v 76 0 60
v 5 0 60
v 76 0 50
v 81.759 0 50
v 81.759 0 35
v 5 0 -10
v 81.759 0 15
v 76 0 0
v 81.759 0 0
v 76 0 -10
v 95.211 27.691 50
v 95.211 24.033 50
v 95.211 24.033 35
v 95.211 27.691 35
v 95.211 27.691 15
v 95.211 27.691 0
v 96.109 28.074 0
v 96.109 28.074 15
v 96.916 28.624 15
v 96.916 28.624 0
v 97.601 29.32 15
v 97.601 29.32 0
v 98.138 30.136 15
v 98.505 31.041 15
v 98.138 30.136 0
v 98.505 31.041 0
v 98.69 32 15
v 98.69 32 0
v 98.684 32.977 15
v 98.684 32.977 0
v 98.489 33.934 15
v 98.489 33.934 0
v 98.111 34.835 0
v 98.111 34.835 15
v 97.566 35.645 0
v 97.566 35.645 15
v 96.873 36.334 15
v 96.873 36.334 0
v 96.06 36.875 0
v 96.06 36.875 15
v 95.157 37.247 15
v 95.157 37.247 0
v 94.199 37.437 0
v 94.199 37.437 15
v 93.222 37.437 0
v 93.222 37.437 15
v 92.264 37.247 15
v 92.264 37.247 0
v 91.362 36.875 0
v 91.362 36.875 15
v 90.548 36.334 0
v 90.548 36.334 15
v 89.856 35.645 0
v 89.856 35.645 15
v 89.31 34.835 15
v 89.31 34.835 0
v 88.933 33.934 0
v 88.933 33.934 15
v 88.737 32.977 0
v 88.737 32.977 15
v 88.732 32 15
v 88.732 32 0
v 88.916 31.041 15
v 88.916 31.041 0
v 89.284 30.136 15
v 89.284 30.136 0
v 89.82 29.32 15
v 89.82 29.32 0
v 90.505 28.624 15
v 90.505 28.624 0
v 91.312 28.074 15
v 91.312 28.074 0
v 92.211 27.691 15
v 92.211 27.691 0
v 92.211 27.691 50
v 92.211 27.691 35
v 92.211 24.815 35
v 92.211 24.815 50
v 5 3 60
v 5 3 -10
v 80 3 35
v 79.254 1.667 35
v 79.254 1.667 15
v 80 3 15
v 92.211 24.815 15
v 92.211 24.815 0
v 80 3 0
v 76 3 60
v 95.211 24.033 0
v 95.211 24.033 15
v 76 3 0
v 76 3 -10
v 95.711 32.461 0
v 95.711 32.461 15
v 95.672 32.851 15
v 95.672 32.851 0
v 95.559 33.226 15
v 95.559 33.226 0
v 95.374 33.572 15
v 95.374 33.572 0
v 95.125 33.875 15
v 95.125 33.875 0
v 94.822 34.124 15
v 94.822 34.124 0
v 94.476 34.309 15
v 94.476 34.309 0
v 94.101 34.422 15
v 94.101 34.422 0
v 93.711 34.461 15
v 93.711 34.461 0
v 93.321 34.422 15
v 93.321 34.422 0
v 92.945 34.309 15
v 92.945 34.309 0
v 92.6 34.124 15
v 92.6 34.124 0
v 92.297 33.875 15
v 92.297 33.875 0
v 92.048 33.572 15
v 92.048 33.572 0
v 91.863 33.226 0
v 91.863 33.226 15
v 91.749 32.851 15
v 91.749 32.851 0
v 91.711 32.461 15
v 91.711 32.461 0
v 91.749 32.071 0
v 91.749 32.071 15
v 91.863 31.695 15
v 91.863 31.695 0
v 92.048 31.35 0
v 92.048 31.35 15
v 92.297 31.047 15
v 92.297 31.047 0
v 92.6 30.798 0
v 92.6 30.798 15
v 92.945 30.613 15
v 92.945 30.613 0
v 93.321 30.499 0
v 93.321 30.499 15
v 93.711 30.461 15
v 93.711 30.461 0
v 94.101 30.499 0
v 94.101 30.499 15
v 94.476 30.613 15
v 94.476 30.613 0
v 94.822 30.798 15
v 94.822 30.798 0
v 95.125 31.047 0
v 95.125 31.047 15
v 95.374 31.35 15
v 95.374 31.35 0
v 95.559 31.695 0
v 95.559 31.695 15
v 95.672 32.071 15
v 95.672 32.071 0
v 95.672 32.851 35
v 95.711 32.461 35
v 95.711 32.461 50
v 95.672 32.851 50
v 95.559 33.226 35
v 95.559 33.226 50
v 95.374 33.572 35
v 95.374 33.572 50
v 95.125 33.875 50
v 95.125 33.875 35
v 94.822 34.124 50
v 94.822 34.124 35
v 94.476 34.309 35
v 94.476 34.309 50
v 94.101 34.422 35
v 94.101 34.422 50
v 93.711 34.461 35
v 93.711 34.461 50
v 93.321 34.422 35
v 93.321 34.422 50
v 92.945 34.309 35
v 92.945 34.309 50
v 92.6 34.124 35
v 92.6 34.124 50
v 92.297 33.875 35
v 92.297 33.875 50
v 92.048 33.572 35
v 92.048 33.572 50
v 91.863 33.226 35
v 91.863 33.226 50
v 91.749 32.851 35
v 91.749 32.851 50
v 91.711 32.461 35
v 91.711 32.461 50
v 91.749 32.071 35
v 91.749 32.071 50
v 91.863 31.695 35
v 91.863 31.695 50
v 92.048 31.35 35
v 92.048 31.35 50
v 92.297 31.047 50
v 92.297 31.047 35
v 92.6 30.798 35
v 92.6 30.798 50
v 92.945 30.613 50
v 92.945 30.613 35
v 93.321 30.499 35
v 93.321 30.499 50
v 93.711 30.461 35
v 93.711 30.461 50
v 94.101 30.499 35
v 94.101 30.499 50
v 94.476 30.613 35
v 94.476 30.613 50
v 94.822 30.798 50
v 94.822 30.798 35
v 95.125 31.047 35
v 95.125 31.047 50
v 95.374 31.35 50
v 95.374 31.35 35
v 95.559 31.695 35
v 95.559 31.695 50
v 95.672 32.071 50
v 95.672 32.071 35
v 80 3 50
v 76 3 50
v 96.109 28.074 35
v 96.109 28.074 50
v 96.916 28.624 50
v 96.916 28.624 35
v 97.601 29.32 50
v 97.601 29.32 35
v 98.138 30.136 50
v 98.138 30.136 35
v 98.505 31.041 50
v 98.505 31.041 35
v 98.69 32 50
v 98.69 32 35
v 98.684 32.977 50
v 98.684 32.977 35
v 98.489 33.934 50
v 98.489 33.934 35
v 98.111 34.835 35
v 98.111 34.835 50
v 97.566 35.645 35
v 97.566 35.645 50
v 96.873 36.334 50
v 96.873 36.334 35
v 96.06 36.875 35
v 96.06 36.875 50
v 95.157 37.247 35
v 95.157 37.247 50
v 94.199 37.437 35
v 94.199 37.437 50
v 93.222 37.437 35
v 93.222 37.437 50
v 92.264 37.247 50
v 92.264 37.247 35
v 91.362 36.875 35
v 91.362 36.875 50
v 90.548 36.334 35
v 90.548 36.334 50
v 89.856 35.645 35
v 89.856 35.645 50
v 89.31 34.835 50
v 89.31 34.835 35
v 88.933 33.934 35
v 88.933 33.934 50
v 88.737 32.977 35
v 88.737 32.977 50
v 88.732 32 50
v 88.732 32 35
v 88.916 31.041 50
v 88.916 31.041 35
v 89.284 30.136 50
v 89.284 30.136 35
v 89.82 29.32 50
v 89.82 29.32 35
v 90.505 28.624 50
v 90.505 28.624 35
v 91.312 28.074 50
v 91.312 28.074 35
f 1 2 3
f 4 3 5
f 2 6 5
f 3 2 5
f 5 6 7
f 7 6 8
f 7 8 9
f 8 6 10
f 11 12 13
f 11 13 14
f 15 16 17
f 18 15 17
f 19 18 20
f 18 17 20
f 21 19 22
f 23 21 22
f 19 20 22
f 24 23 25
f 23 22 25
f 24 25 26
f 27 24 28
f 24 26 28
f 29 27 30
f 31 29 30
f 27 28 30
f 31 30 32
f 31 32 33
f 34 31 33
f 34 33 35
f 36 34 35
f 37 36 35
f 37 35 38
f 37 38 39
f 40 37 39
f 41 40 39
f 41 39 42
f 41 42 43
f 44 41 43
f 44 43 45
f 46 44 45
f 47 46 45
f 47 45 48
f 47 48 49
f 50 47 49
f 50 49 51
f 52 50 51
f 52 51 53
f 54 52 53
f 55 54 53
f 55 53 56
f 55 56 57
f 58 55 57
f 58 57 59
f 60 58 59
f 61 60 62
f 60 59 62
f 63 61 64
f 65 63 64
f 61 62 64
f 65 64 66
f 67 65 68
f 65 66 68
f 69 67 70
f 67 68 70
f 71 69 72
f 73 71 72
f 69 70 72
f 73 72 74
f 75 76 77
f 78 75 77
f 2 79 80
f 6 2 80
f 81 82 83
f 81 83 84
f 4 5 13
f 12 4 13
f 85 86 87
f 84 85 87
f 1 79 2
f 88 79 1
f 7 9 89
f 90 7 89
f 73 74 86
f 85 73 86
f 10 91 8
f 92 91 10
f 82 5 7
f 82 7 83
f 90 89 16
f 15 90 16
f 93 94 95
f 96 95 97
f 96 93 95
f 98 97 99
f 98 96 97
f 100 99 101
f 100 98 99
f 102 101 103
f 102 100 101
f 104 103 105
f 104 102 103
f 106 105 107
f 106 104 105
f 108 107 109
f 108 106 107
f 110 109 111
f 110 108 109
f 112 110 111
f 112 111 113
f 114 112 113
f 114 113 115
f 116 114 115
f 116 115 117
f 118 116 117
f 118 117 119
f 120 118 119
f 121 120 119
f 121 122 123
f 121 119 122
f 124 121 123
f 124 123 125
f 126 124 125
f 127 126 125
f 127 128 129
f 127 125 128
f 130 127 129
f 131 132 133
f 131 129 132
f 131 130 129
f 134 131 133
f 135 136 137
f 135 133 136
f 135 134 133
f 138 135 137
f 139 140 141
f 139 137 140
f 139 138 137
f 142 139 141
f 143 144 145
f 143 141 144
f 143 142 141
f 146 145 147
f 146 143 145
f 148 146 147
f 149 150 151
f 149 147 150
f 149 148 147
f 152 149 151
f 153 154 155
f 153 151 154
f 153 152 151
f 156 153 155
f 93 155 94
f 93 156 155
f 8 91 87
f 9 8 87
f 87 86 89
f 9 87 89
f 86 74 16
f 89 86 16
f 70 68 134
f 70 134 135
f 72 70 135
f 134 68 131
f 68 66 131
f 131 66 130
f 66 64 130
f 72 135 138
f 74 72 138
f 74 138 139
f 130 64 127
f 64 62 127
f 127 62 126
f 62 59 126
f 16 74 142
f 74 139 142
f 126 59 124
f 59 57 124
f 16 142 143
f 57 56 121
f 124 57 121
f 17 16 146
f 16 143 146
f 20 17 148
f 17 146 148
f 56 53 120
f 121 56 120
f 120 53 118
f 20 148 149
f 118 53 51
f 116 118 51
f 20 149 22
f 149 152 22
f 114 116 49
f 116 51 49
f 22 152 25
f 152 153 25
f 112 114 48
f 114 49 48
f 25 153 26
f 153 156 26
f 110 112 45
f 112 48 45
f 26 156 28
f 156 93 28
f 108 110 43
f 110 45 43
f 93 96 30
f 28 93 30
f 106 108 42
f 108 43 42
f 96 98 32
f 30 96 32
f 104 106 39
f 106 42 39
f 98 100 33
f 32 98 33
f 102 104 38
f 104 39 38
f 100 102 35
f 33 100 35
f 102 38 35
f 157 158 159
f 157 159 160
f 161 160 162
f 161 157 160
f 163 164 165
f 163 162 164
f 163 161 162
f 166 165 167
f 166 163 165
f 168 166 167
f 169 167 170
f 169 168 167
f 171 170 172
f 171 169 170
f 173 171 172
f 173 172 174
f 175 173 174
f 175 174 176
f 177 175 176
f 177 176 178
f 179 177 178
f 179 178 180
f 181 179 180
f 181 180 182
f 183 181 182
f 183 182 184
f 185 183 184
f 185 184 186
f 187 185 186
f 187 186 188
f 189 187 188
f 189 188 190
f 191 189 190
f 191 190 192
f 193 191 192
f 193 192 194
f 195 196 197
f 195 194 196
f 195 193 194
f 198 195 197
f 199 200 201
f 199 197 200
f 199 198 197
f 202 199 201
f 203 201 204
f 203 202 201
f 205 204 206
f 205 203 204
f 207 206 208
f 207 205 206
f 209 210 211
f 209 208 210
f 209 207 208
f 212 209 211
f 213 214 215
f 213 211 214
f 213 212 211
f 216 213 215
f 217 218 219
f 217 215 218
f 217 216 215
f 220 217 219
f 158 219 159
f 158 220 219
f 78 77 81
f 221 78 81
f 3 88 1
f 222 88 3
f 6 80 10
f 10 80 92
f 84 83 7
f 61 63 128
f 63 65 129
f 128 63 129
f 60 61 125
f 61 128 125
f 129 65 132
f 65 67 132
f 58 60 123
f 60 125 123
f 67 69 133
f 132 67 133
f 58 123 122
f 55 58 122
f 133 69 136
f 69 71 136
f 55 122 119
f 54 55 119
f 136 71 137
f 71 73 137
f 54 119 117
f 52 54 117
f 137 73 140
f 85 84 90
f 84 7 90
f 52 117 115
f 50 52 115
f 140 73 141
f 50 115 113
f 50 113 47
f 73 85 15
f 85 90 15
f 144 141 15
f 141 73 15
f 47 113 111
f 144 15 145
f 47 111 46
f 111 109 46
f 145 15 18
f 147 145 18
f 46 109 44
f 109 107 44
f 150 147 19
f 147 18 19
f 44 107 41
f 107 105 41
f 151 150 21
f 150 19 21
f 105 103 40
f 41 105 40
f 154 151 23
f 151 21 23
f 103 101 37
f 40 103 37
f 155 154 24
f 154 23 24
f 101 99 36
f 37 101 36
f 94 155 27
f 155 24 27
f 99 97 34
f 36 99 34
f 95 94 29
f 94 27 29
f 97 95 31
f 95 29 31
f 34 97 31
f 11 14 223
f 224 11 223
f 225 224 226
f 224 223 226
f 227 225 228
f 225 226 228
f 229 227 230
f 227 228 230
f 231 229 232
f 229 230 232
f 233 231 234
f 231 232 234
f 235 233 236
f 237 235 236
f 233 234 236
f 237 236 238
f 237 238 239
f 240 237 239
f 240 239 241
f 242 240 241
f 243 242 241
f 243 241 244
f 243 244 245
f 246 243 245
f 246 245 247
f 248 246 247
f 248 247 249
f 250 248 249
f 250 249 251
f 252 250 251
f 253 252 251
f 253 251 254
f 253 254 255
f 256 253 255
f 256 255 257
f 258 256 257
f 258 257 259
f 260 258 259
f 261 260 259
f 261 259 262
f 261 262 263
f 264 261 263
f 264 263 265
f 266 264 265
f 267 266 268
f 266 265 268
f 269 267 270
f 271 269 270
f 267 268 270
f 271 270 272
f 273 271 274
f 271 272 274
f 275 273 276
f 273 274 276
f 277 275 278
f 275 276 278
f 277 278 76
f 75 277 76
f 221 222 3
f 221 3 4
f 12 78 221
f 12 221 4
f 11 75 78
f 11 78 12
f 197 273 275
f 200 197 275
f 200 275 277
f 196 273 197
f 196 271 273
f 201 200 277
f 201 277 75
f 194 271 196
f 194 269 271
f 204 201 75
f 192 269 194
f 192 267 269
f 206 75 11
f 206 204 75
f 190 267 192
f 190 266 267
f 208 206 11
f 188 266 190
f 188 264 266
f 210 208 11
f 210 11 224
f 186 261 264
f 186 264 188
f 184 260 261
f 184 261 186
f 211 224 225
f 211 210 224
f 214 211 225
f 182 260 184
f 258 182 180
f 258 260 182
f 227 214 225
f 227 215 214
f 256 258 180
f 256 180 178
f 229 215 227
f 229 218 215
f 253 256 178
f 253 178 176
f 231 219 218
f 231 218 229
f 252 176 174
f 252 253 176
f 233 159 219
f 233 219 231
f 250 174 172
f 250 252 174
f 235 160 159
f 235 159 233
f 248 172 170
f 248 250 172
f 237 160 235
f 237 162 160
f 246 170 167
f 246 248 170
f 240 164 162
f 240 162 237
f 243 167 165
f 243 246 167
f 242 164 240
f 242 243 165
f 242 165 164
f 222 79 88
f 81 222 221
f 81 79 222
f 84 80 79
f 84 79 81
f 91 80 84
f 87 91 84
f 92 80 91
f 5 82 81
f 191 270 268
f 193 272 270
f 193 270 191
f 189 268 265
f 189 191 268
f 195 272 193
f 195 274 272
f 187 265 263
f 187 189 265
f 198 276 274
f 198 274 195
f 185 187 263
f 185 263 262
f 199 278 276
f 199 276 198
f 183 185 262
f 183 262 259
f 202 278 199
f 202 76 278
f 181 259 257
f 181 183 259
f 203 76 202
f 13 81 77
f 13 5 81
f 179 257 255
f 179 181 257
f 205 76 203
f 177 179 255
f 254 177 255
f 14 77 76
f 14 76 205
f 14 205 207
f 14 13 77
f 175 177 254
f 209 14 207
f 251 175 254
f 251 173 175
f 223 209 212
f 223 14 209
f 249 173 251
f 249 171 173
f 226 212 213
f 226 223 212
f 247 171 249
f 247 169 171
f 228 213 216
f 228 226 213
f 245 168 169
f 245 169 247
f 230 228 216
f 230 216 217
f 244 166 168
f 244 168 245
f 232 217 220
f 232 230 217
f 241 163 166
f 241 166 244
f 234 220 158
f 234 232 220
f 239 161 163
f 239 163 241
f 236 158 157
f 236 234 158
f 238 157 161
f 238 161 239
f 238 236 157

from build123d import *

# Parameters (mm, degrees)
SKETCH1_R               = 5
BOSS_EXTRUDE1_DEPTH     = 50
SKETCH2_R               = 2
CUT_EXTRUDE1_DEPTH      = 51
SKETCH7_W               = 20
SKETCH7_H               = 39.987182744
CUT_EXTRUDE3_DEPTH      = 10
CUT_EXTRUDE3_DEPTH_BACK = 10
BOSS_EXTRUDE2_REACH     = 52
CUT_EXTRUDE4_REACH      = 100.711
SKETCH9_W               = 20
SKETCH9_H               = 10.896319728
CUT_EXTRUDE6_REACH      = 52
SKETCH11_W              = 5
SKETCH11_H              = 3
SKETCH12_W              = 71
SKETCH12_H              = 70
BOSS_EXTRUDE3_DEPTH     = 3


with BuildPart() as part:
    # Sketch1 → Boss-Extrude1 (new body)
    with BuildSketch(Plane.XY):
        with Locations((93.71075113, 32.460861794)):
            Circle(SKETCH1_R)
        Polygon((0, 3), (0, 0), (81.758772051, 0), (95.21075113, 24.032587983), (95.21075113, 29.815076366), (92.21075113, 29.815076366), (92.21075113, 24.815076366), (80, 3), align=None)
    extrude(amount=BOSS_EXTRUDE1_DEPTH)

    # Sketch2 → Cut-Extrude1 (cut, through all)
    with BuildSketch(Plane.XY):
        with Locations((93.71075113, 32.460861794)):
            Circle(SKETCH2_R)
    extrude(amount=CUT_EXTRUDE1_DEPTH, mode=Mode.SUBTRACT)

    # Sketch7 → Cut-Extrude3 (cut, two sides)
    with BuildSketch(Plane(origin=(62.254079791, -34.846042362, 0), x_dir=(0, 0, -1), z_dir=(0.872603055, -0.488430045, 0))) as cut_extrude3_sk:
        with Locations((-25, 59.927032101)):
            Rectangle(SKETCH7_W, SKETCH7_H)
    extrude(amount=CUT_EXTRUDE3_DEPTH, mode=Mode.SUBTRACT)
    extrude(cut_extrude3_sk.sketch, amount=-CUT_EXTRUDE3_DEPTH_BACK, mode=Mode.SUBTRACT)

    # Sketch8 → Boss-Extrude2 (add, up to next)
    with BuildSketch(Plane.XY, mode=Mode.PRIVATE) as boss_extrude2_sk1:
        Polygon((66.951015515, 3), (66.951015515, 0), (81.758772051, 0), (79.25400484, 1.667244856), (80, 3), align=None)
    boss_extrude2_tool1 = extrude(boss_extrude2_sk1.sketch, amount=BOSS_EXTRUDE2_REACH, mode=Mode.PRIVATE) - part.part
    add(boss_extrude2_tool1.solids().sort_by_distance((73.552437, 1.463367, 0))[0])

    # Sketch9 → Cut-Extrude4 (cut, up to next)
    with BuildSketch(Plane(origin=(0, 0, 0), x_dir=(0, 0, -1), z_dir=(1, 0, 0)), mode=Mode.PRIVATE) as cut_extrude4_sk1:
        with Locations((-25, 32.01270193)):
            Rectangle(SKETCH9_W, SKETCH9_H)
    cut_extrude4_tool1 = extrude(cut_extrude4_sk1.sketch, amount=CUT_EXTRUDE4_REACH, mode=Mode.PRIVATE) & part.part
    add(cut_extrude4_tool1.solids().sort_by_distance((0, 32.012702, 25))[0], mode=Mode.SUBTRACT)

    # Sketch11 → Cut-Extrude6 (cut, up to next)
    with BuildSketch(Plane.XY.offset(50), mode=Mode.PRIVATE) as cut_extrude6_sk1:
        with Locations((2.5, 1.5)):
            Rectangle(SKETCH11_W, SKETCH11_H)
    cut_extrude6_tool1 = extrude(cut_extrude6_sk1.sketch, amount=-CUT_EXTRUDE6_REACH, mode=Mode.PRIVATE) & part.part
    add(cut_extrude6_tool1.solids().sort_by_distance((2.5, 1.5, 50))[0], mode=Mode.SUBTRACT)

    # Sketch12 → Boss-Extrude3 (add, through all)
    with BuildSketch(Plane(origin=(0, 3, 0), x_dir=(1, 0, 0), z_dir=(0, 1, 0))):
        with Locations((40.5, -25)):
            Rectangle(SKETCH12_W, SKETCH12_H)
    extrude(amount=-BOSS_EXTRUDE3_DEPTH)


solid = part.part
